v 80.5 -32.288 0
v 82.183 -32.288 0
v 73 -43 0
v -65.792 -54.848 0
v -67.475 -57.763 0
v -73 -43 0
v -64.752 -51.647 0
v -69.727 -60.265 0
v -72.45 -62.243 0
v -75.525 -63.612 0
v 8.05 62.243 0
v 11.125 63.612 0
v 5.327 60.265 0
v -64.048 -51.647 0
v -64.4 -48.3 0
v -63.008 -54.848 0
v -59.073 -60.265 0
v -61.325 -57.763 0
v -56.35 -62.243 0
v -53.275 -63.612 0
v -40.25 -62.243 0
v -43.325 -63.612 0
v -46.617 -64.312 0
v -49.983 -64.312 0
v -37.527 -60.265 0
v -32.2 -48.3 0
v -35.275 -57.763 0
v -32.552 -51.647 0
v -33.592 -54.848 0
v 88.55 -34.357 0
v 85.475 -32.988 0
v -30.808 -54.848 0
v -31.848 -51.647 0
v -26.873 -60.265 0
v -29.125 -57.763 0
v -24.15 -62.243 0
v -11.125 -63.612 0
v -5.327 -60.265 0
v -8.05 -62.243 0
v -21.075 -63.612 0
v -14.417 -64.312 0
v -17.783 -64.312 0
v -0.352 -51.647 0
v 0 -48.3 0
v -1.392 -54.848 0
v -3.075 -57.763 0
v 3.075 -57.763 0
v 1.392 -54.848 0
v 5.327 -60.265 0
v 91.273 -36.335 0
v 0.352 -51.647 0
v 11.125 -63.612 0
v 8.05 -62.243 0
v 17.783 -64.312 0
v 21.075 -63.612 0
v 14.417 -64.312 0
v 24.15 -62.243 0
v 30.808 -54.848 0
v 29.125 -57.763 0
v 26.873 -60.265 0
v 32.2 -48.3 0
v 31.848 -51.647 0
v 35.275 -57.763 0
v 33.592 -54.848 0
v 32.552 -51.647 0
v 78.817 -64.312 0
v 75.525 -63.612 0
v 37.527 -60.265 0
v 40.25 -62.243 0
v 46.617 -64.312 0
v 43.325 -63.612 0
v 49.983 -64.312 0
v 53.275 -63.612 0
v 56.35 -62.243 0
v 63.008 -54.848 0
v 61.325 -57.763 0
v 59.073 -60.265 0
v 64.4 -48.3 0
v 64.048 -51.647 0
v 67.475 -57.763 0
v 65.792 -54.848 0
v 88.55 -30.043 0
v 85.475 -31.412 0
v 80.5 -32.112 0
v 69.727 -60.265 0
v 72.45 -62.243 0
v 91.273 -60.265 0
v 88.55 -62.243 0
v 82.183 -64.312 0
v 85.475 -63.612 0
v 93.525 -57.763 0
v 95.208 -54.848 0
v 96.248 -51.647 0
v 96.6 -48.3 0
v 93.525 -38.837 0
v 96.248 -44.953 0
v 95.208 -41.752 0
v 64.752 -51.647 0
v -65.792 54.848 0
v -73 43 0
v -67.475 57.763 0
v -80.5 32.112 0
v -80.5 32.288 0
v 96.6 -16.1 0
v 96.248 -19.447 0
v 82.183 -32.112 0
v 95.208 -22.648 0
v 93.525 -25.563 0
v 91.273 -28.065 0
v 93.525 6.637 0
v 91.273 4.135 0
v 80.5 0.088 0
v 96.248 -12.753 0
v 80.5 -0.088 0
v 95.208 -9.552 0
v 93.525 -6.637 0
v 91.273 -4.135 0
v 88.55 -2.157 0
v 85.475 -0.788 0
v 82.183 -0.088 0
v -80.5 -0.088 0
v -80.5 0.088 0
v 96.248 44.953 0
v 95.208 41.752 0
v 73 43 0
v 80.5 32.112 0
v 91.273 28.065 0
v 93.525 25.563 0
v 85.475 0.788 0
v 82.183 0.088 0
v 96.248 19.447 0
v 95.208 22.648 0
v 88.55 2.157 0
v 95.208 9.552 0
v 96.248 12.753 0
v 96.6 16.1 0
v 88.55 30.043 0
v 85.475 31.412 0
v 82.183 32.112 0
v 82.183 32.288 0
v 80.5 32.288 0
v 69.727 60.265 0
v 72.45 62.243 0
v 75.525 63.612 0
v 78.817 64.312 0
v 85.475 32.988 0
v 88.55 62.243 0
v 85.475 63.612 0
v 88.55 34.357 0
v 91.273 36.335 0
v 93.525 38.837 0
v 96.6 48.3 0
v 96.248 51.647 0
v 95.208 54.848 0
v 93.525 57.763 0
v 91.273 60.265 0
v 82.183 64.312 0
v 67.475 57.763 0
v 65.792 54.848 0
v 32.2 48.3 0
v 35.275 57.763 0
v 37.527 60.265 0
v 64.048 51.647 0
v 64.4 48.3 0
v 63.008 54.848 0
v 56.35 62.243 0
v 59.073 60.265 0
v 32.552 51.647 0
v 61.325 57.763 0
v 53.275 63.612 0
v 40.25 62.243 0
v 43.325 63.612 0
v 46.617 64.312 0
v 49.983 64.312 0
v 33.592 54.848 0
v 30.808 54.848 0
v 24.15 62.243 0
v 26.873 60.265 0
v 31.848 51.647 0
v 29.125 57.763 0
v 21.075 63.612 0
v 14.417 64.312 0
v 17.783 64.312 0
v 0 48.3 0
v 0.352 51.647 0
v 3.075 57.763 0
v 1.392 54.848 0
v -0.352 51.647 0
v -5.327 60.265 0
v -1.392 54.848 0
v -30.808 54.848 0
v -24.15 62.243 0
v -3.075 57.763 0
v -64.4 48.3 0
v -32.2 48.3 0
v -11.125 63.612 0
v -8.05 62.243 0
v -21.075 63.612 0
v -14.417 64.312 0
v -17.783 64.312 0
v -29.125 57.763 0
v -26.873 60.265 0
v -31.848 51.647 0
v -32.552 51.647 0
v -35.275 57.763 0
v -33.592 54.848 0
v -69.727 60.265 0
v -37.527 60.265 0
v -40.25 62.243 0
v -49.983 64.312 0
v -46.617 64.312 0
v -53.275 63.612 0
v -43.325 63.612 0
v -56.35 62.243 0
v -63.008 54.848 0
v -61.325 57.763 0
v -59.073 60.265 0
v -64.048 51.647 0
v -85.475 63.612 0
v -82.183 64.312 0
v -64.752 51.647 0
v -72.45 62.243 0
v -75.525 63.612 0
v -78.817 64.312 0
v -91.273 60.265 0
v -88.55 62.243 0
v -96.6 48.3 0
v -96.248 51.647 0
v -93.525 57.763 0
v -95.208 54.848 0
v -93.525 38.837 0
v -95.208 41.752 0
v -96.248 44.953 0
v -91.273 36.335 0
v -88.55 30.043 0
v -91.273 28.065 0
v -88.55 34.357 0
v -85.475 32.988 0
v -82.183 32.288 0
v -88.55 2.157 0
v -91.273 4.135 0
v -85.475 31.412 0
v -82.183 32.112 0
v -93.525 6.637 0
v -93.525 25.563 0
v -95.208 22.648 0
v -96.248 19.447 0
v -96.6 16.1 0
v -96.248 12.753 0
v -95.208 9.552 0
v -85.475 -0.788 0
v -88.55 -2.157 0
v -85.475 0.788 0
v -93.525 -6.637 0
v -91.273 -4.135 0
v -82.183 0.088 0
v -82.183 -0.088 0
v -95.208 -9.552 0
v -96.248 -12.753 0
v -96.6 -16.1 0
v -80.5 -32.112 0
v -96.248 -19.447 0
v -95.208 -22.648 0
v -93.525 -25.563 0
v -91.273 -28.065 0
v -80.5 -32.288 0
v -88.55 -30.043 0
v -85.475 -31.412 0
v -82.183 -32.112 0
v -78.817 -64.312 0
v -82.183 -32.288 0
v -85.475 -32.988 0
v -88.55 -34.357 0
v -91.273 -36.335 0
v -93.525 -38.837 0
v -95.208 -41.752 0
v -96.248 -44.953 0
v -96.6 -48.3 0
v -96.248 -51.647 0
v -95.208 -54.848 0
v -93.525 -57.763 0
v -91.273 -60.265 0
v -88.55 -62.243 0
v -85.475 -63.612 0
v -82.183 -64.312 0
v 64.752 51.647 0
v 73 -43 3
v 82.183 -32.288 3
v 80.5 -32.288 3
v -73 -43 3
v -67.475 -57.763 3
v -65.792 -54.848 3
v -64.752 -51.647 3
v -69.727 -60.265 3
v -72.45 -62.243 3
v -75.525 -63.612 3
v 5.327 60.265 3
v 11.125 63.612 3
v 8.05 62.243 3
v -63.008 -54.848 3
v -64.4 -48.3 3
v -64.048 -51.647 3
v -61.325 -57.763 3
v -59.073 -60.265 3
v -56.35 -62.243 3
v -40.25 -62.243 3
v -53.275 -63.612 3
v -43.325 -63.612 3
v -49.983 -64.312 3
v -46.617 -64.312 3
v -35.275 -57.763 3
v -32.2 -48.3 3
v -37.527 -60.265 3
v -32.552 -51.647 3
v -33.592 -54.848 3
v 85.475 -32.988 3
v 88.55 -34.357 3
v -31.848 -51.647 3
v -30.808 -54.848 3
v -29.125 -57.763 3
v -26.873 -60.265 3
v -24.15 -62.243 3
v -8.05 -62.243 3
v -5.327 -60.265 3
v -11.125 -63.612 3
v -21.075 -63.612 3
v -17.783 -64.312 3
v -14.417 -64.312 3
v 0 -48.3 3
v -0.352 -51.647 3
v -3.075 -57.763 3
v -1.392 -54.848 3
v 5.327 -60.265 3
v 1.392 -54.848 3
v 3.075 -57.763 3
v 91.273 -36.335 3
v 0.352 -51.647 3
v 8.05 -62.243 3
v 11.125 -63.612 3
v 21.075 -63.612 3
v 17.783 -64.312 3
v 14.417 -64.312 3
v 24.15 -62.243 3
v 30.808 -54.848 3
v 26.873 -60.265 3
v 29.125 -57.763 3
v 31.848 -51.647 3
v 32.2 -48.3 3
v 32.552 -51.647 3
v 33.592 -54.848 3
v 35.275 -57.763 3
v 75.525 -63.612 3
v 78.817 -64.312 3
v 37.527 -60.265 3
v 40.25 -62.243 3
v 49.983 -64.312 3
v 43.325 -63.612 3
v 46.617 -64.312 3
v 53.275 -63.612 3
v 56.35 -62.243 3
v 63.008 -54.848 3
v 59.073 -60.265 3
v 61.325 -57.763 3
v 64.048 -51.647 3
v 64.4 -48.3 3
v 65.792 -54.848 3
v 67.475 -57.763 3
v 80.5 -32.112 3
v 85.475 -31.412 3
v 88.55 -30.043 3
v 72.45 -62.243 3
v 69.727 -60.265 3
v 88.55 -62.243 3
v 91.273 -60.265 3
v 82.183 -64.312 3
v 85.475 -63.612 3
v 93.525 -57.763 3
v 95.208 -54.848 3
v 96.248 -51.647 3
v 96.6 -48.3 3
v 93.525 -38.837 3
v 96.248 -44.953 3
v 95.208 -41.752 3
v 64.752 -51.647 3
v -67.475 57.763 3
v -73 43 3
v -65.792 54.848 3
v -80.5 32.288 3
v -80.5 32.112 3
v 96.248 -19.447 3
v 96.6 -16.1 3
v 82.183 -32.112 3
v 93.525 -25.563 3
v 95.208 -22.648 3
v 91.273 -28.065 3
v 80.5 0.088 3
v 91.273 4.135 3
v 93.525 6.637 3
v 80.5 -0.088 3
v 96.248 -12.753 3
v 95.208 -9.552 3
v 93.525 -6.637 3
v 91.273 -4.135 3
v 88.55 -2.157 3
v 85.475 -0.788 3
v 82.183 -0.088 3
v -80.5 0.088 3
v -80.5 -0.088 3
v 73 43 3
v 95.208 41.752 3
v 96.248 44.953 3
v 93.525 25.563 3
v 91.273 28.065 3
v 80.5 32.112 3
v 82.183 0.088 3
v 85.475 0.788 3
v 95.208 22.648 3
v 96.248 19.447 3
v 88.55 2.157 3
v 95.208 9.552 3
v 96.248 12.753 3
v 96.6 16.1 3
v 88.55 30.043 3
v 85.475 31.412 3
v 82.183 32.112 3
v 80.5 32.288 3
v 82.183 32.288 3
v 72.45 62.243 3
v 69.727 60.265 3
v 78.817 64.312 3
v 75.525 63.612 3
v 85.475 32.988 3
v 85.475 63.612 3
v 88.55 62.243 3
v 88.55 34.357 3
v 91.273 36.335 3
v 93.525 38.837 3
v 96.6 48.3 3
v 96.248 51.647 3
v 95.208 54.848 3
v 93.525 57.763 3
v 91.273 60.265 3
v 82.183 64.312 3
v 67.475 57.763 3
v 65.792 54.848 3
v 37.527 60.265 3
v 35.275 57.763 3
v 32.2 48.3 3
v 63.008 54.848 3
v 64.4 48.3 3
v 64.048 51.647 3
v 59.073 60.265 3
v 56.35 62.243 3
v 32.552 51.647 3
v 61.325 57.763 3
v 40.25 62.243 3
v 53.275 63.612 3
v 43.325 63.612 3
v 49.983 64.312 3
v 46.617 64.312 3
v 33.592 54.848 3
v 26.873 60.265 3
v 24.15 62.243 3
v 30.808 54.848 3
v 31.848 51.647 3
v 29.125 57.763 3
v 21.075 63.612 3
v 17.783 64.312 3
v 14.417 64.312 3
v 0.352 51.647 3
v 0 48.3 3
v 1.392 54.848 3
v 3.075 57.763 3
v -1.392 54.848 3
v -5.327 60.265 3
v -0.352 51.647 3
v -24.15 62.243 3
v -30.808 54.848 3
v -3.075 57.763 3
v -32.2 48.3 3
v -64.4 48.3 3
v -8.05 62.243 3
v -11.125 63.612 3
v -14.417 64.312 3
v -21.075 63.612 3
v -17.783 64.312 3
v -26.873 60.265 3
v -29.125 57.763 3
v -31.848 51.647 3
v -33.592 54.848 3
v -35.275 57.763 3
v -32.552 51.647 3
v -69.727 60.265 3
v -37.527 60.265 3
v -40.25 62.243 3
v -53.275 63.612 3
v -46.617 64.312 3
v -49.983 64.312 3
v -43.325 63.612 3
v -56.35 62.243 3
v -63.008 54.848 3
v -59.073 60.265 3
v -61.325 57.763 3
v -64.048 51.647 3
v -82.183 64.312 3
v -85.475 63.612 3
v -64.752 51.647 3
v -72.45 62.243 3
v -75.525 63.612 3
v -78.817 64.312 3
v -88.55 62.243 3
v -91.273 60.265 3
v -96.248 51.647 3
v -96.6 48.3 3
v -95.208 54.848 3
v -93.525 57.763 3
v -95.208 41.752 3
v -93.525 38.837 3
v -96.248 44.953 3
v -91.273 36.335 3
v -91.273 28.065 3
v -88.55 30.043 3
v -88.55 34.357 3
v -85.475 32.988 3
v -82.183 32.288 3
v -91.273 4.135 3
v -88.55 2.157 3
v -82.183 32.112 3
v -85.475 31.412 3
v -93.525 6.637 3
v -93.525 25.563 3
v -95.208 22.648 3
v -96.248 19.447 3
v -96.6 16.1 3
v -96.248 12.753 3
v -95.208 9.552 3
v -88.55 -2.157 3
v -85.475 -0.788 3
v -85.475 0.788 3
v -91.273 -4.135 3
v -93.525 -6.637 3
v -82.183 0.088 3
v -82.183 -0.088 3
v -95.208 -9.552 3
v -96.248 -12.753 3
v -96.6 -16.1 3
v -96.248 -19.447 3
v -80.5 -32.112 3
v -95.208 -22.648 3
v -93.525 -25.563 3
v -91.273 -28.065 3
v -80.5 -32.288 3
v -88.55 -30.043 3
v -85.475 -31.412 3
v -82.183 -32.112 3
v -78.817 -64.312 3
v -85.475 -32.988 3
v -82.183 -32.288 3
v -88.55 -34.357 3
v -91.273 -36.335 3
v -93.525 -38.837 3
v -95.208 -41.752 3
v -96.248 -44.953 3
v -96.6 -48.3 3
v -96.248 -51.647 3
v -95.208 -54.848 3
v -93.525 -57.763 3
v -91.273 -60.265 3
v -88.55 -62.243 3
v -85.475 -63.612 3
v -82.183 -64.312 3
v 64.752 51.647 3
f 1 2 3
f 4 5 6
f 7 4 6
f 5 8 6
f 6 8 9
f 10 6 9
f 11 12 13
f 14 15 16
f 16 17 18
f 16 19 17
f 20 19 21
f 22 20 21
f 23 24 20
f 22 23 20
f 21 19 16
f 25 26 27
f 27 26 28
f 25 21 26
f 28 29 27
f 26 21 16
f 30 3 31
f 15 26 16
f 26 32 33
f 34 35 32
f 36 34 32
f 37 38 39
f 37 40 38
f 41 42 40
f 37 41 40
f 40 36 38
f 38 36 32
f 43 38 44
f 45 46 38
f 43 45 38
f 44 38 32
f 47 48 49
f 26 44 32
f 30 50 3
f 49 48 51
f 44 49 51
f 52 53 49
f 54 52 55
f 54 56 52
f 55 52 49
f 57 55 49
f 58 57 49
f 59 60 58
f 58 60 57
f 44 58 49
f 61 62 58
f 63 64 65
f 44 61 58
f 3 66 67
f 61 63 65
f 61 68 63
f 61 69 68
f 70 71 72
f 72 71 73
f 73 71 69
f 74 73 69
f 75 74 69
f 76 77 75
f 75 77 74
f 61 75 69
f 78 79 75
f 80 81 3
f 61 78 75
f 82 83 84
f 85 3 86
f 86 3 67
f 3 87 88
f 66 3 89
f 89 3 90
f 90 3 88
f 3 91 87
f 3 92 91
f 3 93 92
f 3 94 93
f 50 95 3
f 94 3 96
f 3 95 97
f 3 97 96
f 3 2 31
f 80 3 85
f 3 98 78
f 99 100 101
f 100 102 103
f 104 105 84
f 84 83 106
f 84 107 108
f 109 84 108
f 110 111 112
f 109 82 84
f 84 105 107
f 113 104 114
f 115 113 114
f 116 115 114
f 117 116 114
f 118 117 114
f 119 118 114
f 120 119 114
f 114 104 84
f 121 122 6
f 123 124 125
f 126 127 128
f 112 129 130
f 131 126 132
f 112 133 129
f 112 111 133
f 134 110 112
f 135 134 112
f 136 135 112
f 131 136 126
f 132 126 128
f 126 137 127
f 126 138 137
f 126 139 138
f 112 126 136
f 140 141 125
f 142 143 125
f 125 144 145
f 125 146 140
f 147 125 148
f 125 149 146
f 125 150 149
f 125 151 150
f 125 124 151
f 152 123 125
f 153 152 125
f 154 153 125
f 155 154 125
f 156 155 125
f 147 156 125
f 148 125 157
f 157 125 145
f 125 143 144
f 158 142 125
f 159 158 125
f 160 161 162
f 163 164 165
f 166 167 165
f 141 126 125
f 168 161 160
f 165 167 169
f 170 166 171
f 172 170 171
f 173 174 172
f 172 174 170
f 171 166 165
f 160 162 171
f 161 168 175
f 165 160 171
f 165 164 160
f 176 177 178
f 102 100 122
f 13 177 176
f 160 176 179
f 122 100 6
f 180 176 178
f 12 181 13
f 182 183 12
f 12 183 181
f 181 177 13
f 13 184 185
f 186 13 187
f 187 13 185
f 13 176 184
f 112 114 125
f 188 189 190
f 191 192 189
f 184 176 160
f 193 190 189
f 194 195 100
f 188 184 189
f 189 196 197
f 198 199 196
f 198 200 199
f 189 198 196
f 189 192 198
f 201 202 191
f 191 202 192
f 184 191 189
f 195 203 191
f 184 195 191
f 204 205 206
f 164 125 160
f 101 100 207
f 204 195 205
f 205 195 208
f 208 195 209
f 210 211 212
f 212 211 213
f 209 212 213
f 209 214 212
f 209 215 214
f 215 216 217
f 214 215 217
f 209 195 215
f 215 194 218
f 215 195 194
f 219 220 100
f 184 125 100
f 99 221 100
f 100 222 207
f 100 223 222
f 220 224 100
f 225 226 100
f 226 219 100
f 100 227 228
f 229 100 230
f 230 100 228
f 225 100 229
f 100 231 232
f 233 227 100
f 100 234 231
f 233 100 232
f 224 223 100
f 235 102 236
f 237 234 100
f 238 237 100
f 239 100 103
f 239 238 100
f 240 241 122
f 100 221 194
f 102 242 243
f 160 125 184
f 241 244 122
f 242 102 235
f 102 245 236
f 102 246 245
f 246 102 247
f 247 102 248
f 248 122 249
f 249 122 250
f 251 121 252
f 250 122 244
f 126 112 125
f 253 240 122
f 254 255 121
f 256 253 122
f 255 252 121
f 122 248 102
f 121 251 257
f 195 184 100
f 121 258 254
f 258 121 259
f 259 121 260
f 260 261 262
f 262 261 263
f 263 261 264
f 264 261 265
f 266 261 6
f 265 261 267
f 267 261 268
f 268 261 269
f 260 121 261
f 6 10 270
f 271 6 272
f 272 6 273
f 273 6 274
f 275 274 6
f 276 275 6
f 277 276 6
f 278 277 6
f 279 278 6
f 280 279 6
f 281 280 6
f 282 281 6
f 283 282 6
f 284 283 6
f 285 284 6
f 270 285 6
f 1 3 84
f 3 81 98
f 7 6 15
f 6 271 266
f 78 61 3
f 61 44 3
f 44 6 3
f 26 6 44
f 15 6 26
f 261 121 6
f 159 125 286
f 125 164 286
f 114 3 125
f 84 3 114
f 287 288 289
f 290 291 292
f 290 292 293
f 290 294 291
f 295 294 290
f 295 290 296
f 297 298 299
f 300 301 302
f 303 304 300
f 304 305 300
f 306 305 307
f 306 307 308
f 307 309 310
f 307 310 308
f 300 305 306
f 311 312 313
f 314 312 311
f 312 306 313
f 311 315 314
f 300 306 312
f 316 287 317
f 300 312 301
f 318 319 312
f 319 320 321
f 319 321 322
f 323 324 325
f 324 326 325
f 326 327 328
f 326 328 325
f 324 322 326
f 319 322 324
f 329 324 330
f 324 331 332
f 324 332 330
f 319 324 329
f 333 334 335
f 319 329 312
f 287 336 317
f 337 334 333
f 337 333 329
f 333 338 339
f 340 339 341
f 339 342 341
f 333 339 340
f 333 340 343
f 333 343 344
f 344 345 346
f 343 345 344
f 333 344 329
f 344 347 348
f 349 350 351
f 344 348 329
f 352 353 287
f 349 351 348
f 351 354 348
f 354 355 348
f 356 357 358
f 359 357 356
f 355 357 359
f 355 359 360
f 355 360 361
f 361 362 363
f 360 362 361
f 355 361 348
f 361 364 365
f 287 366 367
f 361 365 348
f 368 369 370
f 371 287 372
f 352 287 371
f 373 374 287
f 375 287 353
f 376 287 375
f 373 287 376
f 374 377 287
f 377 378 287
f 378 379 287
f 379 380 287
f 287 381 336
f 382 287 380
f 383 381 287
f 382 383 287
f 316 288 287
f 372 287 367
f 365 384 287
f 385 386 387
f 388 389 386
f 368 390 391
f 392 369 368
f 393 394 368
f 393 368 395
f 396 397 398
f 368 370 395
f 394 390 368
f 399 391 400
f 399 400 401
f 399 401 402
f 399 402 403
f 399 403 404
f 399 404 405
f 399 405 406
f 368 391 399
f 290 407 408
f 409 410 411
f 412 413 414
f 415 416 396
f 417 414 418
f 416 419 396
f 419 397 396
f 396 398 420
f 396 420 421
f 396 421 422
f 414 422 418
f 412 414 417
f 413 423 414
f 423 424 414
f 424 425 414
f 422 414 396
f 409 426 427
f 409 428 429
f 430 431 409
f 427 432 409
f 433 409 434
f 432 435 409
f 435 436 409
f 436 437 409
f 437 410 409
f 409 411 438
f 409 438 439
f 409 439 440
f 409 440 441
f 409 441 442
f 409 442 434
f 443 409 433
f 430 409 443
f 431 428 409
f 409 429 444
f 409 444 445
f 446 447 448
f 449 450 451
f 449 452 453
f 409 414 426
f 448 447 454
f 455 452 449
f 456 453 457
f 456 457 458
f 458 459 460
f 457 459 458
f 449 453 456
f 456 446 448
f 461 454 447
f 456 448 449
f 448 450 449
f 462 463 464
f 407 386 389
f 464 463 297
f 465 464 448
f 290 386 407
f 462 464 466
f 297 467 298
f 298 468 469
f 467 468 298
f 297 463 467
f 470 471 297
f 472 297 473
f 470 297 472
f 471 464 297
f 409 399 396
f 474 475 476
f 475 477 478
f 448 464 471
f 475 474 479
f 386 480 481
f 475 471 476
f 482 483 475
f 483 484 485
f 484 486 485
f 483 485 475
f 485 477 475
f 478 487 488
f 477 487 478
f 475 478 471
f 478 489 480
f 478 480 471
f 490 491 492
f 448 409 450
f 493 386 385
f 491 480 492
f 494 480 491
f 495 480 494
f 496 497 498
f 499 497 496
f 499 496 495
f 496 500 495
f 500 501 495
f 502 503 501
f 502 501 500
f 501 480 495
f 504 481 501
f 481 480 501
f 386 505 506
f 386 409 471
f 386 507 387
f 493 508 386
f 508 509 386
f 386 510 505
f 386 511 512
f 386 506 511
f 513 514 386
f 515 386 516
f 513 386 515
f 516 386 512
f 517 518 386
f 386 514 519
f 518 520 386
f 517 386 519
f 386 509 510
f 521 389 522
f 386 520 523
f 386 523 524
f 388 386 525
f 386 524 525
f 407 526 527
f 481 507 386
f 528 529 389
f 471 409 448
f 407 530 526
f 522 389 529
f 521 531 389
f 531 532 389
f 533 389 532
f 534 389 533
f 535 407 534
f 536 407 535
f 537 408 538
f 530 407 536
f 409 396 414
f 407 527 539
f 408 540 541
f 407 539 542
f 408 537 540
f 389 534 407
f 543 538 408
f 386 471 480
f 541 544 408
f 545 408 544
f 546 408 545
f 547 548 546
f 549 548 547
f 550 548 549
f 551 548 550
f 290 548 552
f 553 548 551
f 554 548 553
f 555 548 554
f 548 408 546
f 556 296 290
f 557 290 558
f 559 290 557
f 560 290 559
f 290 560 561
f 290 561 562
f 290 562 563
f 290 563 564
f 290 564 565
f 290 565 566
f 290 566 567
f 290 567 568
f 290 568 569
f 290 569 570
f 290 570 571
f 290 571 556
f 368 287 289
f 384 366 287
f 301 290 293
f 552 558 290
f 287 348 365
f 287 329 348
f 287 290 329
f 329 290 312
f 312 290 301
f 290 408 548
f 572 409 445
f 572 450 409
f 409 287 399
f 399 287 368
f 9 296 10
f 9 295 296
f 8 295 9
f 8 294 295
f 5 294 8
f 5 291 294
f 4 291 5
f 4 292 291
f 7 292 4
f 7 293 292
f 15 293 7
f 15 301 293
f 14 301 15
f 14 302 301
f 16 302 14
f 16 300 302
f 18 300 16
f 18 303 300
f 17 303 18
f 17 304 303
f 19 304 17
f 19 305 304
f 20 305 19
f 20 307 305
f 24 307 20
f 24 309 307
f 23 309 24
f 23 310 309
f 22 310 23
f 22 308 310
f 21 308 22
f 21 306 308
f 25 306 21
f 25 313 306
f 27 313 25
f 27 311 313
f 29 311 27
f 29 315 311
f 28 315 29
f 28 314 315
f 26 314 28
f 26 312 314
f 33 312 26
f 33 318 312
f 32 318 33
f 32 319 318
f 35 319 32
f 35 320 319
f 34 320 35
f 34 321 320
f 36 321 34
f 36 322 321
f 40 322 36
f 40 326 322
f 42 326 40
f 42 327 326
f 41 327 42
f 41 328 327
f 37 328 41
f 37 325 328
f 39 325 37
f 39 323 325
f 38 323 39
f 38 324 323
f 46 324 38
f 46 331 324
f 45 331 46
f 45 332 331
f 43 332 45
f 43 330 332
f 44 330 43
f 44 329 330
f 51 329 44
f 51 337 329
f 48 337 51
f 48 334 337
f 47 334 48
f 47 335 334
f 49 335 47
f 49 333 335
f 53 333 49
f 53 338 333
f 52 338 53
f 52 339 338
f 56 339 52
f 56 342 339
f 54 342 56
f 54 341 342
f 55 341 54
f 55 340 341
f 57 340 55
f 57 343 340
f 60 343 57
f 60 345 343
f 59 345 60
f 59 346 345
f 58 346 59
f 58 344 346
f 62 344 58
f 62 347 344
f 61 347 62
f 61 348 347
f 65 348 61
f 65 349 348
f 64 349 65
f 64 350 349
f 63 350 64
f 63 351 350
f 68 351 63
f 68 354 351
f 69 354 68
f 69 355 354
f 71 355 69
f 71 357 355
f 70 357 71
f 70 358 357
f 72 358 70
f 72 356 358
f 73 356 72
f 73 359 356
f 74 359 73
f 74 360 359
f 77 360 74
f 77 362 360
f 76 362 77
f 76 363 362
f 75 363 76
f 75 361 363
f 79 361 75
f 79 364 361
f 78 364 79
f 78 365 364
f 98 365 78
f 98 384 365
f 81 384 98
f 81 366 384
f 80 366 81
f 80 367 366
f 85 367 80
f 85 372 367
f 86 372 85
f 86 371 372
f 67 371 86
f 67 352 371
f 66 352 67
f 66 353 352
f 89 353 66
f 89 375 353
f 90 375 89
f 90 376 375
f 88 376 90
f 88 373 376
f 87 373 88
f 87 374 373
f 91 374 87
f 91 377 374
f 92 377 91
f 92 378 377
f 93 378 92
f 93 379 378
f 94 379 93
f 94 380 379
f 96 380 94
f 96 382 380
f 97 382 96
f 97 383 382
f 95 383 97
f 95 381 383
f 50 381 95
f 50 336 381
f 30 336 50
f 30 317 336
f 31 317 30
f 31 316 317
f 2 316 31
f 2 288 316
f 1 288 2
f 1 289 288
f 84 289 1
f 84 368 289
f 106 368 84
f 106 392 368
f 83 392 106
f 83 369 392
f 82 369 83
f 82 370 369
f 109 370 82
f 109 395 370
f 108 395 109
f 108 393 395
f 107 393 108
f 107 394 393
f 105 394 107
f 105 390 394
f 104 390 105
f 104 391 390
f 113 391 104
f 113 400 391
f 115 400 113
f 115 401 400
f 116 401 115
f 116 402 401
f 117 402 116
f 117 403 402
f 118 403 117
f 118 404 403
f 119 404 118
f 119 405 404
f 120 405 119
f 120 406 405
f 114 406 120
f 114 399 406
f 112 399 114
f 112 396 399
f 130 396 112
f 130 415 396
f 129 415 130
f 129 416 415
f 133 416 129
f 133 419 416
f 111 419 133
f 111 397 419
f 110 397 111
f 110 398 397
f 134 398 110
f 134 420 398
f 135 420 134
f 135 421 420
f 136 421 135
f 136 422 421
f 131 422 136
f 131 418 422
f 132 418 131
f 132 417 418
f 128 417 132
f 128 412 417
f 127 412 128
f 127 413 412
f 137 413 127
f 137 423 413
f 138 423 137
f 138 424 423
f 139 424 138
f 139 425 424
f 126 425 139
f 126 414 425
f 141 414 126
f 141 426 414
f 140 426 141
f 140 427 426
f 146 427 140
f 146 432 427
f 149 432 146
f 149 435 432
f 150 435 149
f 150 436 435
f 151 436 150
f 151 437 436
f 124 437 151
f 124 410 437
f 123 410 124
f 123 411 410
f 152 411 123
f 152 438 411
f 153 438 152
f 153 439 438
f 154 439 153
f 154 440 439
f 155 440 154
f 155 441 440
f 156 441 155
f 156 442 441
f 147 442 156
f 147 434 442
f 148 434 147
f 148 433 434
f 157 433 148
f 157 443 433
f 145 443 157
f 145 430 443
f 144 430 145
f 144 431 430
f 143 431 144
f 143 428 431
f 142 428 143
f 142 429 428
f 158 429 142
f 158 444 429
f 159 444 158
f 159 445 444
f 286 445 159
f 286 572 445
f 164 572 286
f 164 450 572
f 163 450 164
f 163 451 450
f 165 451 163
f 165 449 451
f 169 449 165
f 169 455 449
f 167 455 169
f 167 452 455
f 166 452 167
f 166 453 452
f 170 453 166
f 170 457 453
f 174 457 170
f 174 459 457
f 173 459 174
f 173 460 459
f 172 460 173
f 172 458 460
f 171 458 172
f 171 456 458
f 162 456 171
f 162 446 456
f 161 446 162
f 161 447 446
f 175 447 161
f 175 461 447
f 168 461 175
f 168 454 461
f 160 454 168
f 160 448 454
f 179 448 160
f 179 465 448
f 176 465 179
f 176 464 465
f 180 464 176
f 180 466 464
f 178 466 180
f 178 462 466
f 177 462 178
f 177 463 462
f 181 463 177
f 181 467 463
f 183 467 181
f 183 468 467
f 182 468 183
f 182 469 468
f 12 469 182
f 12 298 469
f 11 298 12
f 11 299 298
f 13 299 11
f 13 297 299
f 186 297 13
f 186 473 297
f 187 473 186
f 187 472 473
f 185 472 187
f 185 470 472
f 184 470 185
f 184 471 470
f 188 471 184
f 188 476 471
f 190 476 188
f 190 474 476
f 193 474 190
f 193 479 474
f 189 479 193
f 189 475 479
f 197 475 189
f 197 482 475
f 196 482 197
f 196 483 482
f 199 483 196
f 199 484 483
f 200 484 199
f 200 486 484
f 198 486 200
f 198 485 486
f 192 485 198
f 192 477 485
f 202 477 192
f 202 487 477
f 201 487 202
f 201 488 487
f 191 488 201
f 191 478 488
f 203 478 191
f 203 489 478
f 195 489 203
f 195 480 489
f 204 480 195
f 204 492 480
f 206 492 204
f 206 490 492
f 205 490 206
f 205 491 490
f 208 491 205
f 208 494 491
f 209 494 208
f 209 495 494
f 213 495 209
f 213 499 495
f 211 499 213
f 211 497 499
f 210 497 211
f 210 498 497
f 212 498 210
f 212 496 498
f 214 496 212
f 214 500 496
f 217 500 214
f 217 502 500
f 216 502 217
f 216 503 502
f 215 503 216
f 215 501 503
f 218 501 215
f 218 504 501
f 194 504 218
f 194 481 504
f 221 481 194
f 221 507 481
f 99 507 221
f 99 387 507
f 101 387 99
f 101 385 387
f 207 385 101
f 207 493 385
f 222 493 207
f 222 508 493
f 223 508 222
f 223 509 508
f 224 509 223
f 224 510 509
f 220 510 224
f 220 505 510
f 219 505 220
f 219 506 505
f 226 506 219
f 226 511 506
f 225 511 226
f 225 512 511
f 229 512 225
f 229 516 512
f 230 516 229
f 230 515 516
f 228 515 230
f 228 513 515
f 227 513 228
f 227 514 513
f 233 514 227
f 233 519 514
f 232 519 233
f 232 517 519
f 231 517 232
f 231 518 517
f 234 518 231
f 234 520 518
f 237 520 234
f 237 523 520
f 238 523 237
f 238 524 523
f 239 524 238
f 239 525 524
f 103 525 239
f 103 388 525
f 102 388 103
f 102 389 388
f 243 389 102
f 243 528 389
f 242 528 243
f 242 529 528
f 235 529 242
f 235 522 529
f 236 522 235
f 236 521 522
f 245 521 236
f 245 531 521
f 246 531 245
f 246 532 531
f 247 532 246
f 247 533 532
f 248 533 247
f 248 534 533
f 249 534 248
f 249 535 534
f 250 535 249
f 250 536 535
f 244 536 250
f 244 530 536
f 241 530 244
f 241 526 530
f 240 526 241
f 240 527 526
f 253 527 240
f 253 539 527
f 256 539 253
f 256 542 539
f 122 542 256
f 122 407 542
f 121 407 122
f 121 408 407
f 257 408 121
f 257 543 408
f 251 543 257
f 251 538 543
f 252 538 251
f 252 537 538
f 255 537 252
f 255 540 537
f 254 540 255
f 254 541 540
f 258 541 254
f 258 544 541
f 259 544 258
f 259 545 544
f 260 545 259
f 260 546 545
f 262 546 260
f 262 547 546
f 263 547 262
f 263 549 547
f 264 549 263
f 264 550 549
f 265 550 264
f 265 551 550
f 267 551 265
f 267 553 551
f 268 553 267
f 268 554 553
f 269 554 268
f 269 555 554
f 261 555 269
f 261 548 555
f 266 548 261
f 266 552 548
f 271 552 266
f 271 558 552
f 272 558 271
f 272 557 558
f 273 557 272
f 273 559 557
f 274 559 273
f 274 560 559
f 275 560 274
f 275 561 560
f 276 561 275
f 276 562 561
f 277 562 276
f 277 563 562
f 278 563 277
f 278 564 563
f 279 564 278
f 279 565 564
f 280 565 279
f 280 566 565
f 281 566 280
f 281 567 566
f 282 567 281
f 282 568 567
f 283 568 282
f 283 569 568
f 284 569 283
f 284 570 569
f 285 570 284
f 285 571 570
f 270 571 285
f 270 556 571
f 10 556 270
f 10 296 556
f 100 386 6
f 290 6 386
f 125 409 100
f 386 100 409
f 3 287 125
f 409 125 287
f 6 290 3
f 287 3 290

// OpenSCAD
// [UK double gang socket width in mm]
socket_width = 146;   
// [UK double gang socket height in mm]
socket_height = 86;   
// [Border width around the socket]
border_width = 10;  
// [Number of circles along width]
num_circles_x = 6;    
// [Thickness of cover]
thickness = 3;
// [Edge style selection]
edge_style = "scalloped"; // ["scalloped", "wave", "none"]

// Wave Settings:
// [Circle Multiplier]
circleness = 0.75;

// Derived dimensions
total_width = socket_width + 1.5 * border_width;
min_height = socket_height + 1.5 * border_width;
circle_diameter_x = total_width / (num_circles_x - 1);

num_circles_y = ceil((min_height + (0.7 * circle_diameter_x)) / circle_diameter_x);
total_height = circle_diameter_x * (num_circles_y - 1);
circle_diameter_y = circle_diameter_x;

// Function to place circles along an edge
module place_circles(start, end, count) {
    for (i = [0 : count - 1]) {
        pos = start + (end - start) * i / (count - 1);
        translate([pos.x, pos.y]) circle(d=circle_diameter_x);
    }
}


// Generate filled rectangle with selected edge style
linear_extrude(height=thickness) {
    difference() {
        union() {
            // Filled rectangle
            square([total_width, total_height], center=true);
            
            // Apply selected edge style
            if (edge_style == "scalloped") {
                scalloped_rectangle();
            } else if (edge_style == "wave") {
                wave_rectangle(false);
            }
            else {
                // None
            }
                
        }
        
        // Cutout for the socket
        square([socket_width, socket_height], center=true);
        
        if (edge_style == "wave") {
            #wave_rectangle(true);
        }
    }
}

// Generate circles around the rectangle for scalloped effect
module scalloped_rectangle() {
    // Top edge
    place_circles([ -total_width / 2, total_height / 2 ], 
                  [ total_width / 2, total_height / 2 ], num_circles_x);
    
    // Bottom edge
    place_circles([ -total_width / 2, -total_height / 2 ], 
                  [ total_width / 2, -total_height / 2 ], num_circles_x);
    
    // Left edge
    place_circles([ -total_width / 2, -total_height / 2 ], 
                  [ -total_width / 2, total_height / 2 ], num_circles_y);
    
    // Right edge
    place_circles([ total_width / 2, -total_height / 2 ], 
                  [ total_width / 2, total_height / 2 ], num_circles_y);
}

// Generate a wave pattern around the rectangle
module wave_rectangle(inverse) {
    // Top edge
    wave_circles([ -total_width / 2, total_height / 2 ], 
                 [ total_width / 2, total_height / 2 ], num_circles_x , true, inverse);
    
    // Bottom edge
    wave_circles([ -total_width / 2, -total_height / 2 ], 
                 [ total_width / 2, -total_height / 2 ], num_circles_x , true, inverse);
    
    // Left edge
    wave_circles([ -total_width / 2, -total_height / 2 ], 
                 [ -total_width / 2, total_height / 2 ], num_circles_y, false, inverse);
    
    // Right edge
    wave_circles([ total_width / 2, -total_height / 2 ], 
                 [ total_width / 2, total_height / 2 ], num_circles_y , false, inverse);
}

// Function to place alternating circles along an edge for wave effect
module wave_circles(start, end, count, horizontal, inverse) {
    for (i = [0 : count - 1]) {
        pos = start + (end - start) * i / (count - 1);
        
        check = inverse ? 1 : 0;  // Set check dynamically based on inverse

        scalex = !horizontal ? circleness : 1;
        scaley = horizontal ? circleness : 1;
           
        if ((i % 2) == check) {
            translate([pos.x, pos.y])
                scale([scalex,scaley])
                   circle(d=circle_diameter_x);
        }
    }
}
